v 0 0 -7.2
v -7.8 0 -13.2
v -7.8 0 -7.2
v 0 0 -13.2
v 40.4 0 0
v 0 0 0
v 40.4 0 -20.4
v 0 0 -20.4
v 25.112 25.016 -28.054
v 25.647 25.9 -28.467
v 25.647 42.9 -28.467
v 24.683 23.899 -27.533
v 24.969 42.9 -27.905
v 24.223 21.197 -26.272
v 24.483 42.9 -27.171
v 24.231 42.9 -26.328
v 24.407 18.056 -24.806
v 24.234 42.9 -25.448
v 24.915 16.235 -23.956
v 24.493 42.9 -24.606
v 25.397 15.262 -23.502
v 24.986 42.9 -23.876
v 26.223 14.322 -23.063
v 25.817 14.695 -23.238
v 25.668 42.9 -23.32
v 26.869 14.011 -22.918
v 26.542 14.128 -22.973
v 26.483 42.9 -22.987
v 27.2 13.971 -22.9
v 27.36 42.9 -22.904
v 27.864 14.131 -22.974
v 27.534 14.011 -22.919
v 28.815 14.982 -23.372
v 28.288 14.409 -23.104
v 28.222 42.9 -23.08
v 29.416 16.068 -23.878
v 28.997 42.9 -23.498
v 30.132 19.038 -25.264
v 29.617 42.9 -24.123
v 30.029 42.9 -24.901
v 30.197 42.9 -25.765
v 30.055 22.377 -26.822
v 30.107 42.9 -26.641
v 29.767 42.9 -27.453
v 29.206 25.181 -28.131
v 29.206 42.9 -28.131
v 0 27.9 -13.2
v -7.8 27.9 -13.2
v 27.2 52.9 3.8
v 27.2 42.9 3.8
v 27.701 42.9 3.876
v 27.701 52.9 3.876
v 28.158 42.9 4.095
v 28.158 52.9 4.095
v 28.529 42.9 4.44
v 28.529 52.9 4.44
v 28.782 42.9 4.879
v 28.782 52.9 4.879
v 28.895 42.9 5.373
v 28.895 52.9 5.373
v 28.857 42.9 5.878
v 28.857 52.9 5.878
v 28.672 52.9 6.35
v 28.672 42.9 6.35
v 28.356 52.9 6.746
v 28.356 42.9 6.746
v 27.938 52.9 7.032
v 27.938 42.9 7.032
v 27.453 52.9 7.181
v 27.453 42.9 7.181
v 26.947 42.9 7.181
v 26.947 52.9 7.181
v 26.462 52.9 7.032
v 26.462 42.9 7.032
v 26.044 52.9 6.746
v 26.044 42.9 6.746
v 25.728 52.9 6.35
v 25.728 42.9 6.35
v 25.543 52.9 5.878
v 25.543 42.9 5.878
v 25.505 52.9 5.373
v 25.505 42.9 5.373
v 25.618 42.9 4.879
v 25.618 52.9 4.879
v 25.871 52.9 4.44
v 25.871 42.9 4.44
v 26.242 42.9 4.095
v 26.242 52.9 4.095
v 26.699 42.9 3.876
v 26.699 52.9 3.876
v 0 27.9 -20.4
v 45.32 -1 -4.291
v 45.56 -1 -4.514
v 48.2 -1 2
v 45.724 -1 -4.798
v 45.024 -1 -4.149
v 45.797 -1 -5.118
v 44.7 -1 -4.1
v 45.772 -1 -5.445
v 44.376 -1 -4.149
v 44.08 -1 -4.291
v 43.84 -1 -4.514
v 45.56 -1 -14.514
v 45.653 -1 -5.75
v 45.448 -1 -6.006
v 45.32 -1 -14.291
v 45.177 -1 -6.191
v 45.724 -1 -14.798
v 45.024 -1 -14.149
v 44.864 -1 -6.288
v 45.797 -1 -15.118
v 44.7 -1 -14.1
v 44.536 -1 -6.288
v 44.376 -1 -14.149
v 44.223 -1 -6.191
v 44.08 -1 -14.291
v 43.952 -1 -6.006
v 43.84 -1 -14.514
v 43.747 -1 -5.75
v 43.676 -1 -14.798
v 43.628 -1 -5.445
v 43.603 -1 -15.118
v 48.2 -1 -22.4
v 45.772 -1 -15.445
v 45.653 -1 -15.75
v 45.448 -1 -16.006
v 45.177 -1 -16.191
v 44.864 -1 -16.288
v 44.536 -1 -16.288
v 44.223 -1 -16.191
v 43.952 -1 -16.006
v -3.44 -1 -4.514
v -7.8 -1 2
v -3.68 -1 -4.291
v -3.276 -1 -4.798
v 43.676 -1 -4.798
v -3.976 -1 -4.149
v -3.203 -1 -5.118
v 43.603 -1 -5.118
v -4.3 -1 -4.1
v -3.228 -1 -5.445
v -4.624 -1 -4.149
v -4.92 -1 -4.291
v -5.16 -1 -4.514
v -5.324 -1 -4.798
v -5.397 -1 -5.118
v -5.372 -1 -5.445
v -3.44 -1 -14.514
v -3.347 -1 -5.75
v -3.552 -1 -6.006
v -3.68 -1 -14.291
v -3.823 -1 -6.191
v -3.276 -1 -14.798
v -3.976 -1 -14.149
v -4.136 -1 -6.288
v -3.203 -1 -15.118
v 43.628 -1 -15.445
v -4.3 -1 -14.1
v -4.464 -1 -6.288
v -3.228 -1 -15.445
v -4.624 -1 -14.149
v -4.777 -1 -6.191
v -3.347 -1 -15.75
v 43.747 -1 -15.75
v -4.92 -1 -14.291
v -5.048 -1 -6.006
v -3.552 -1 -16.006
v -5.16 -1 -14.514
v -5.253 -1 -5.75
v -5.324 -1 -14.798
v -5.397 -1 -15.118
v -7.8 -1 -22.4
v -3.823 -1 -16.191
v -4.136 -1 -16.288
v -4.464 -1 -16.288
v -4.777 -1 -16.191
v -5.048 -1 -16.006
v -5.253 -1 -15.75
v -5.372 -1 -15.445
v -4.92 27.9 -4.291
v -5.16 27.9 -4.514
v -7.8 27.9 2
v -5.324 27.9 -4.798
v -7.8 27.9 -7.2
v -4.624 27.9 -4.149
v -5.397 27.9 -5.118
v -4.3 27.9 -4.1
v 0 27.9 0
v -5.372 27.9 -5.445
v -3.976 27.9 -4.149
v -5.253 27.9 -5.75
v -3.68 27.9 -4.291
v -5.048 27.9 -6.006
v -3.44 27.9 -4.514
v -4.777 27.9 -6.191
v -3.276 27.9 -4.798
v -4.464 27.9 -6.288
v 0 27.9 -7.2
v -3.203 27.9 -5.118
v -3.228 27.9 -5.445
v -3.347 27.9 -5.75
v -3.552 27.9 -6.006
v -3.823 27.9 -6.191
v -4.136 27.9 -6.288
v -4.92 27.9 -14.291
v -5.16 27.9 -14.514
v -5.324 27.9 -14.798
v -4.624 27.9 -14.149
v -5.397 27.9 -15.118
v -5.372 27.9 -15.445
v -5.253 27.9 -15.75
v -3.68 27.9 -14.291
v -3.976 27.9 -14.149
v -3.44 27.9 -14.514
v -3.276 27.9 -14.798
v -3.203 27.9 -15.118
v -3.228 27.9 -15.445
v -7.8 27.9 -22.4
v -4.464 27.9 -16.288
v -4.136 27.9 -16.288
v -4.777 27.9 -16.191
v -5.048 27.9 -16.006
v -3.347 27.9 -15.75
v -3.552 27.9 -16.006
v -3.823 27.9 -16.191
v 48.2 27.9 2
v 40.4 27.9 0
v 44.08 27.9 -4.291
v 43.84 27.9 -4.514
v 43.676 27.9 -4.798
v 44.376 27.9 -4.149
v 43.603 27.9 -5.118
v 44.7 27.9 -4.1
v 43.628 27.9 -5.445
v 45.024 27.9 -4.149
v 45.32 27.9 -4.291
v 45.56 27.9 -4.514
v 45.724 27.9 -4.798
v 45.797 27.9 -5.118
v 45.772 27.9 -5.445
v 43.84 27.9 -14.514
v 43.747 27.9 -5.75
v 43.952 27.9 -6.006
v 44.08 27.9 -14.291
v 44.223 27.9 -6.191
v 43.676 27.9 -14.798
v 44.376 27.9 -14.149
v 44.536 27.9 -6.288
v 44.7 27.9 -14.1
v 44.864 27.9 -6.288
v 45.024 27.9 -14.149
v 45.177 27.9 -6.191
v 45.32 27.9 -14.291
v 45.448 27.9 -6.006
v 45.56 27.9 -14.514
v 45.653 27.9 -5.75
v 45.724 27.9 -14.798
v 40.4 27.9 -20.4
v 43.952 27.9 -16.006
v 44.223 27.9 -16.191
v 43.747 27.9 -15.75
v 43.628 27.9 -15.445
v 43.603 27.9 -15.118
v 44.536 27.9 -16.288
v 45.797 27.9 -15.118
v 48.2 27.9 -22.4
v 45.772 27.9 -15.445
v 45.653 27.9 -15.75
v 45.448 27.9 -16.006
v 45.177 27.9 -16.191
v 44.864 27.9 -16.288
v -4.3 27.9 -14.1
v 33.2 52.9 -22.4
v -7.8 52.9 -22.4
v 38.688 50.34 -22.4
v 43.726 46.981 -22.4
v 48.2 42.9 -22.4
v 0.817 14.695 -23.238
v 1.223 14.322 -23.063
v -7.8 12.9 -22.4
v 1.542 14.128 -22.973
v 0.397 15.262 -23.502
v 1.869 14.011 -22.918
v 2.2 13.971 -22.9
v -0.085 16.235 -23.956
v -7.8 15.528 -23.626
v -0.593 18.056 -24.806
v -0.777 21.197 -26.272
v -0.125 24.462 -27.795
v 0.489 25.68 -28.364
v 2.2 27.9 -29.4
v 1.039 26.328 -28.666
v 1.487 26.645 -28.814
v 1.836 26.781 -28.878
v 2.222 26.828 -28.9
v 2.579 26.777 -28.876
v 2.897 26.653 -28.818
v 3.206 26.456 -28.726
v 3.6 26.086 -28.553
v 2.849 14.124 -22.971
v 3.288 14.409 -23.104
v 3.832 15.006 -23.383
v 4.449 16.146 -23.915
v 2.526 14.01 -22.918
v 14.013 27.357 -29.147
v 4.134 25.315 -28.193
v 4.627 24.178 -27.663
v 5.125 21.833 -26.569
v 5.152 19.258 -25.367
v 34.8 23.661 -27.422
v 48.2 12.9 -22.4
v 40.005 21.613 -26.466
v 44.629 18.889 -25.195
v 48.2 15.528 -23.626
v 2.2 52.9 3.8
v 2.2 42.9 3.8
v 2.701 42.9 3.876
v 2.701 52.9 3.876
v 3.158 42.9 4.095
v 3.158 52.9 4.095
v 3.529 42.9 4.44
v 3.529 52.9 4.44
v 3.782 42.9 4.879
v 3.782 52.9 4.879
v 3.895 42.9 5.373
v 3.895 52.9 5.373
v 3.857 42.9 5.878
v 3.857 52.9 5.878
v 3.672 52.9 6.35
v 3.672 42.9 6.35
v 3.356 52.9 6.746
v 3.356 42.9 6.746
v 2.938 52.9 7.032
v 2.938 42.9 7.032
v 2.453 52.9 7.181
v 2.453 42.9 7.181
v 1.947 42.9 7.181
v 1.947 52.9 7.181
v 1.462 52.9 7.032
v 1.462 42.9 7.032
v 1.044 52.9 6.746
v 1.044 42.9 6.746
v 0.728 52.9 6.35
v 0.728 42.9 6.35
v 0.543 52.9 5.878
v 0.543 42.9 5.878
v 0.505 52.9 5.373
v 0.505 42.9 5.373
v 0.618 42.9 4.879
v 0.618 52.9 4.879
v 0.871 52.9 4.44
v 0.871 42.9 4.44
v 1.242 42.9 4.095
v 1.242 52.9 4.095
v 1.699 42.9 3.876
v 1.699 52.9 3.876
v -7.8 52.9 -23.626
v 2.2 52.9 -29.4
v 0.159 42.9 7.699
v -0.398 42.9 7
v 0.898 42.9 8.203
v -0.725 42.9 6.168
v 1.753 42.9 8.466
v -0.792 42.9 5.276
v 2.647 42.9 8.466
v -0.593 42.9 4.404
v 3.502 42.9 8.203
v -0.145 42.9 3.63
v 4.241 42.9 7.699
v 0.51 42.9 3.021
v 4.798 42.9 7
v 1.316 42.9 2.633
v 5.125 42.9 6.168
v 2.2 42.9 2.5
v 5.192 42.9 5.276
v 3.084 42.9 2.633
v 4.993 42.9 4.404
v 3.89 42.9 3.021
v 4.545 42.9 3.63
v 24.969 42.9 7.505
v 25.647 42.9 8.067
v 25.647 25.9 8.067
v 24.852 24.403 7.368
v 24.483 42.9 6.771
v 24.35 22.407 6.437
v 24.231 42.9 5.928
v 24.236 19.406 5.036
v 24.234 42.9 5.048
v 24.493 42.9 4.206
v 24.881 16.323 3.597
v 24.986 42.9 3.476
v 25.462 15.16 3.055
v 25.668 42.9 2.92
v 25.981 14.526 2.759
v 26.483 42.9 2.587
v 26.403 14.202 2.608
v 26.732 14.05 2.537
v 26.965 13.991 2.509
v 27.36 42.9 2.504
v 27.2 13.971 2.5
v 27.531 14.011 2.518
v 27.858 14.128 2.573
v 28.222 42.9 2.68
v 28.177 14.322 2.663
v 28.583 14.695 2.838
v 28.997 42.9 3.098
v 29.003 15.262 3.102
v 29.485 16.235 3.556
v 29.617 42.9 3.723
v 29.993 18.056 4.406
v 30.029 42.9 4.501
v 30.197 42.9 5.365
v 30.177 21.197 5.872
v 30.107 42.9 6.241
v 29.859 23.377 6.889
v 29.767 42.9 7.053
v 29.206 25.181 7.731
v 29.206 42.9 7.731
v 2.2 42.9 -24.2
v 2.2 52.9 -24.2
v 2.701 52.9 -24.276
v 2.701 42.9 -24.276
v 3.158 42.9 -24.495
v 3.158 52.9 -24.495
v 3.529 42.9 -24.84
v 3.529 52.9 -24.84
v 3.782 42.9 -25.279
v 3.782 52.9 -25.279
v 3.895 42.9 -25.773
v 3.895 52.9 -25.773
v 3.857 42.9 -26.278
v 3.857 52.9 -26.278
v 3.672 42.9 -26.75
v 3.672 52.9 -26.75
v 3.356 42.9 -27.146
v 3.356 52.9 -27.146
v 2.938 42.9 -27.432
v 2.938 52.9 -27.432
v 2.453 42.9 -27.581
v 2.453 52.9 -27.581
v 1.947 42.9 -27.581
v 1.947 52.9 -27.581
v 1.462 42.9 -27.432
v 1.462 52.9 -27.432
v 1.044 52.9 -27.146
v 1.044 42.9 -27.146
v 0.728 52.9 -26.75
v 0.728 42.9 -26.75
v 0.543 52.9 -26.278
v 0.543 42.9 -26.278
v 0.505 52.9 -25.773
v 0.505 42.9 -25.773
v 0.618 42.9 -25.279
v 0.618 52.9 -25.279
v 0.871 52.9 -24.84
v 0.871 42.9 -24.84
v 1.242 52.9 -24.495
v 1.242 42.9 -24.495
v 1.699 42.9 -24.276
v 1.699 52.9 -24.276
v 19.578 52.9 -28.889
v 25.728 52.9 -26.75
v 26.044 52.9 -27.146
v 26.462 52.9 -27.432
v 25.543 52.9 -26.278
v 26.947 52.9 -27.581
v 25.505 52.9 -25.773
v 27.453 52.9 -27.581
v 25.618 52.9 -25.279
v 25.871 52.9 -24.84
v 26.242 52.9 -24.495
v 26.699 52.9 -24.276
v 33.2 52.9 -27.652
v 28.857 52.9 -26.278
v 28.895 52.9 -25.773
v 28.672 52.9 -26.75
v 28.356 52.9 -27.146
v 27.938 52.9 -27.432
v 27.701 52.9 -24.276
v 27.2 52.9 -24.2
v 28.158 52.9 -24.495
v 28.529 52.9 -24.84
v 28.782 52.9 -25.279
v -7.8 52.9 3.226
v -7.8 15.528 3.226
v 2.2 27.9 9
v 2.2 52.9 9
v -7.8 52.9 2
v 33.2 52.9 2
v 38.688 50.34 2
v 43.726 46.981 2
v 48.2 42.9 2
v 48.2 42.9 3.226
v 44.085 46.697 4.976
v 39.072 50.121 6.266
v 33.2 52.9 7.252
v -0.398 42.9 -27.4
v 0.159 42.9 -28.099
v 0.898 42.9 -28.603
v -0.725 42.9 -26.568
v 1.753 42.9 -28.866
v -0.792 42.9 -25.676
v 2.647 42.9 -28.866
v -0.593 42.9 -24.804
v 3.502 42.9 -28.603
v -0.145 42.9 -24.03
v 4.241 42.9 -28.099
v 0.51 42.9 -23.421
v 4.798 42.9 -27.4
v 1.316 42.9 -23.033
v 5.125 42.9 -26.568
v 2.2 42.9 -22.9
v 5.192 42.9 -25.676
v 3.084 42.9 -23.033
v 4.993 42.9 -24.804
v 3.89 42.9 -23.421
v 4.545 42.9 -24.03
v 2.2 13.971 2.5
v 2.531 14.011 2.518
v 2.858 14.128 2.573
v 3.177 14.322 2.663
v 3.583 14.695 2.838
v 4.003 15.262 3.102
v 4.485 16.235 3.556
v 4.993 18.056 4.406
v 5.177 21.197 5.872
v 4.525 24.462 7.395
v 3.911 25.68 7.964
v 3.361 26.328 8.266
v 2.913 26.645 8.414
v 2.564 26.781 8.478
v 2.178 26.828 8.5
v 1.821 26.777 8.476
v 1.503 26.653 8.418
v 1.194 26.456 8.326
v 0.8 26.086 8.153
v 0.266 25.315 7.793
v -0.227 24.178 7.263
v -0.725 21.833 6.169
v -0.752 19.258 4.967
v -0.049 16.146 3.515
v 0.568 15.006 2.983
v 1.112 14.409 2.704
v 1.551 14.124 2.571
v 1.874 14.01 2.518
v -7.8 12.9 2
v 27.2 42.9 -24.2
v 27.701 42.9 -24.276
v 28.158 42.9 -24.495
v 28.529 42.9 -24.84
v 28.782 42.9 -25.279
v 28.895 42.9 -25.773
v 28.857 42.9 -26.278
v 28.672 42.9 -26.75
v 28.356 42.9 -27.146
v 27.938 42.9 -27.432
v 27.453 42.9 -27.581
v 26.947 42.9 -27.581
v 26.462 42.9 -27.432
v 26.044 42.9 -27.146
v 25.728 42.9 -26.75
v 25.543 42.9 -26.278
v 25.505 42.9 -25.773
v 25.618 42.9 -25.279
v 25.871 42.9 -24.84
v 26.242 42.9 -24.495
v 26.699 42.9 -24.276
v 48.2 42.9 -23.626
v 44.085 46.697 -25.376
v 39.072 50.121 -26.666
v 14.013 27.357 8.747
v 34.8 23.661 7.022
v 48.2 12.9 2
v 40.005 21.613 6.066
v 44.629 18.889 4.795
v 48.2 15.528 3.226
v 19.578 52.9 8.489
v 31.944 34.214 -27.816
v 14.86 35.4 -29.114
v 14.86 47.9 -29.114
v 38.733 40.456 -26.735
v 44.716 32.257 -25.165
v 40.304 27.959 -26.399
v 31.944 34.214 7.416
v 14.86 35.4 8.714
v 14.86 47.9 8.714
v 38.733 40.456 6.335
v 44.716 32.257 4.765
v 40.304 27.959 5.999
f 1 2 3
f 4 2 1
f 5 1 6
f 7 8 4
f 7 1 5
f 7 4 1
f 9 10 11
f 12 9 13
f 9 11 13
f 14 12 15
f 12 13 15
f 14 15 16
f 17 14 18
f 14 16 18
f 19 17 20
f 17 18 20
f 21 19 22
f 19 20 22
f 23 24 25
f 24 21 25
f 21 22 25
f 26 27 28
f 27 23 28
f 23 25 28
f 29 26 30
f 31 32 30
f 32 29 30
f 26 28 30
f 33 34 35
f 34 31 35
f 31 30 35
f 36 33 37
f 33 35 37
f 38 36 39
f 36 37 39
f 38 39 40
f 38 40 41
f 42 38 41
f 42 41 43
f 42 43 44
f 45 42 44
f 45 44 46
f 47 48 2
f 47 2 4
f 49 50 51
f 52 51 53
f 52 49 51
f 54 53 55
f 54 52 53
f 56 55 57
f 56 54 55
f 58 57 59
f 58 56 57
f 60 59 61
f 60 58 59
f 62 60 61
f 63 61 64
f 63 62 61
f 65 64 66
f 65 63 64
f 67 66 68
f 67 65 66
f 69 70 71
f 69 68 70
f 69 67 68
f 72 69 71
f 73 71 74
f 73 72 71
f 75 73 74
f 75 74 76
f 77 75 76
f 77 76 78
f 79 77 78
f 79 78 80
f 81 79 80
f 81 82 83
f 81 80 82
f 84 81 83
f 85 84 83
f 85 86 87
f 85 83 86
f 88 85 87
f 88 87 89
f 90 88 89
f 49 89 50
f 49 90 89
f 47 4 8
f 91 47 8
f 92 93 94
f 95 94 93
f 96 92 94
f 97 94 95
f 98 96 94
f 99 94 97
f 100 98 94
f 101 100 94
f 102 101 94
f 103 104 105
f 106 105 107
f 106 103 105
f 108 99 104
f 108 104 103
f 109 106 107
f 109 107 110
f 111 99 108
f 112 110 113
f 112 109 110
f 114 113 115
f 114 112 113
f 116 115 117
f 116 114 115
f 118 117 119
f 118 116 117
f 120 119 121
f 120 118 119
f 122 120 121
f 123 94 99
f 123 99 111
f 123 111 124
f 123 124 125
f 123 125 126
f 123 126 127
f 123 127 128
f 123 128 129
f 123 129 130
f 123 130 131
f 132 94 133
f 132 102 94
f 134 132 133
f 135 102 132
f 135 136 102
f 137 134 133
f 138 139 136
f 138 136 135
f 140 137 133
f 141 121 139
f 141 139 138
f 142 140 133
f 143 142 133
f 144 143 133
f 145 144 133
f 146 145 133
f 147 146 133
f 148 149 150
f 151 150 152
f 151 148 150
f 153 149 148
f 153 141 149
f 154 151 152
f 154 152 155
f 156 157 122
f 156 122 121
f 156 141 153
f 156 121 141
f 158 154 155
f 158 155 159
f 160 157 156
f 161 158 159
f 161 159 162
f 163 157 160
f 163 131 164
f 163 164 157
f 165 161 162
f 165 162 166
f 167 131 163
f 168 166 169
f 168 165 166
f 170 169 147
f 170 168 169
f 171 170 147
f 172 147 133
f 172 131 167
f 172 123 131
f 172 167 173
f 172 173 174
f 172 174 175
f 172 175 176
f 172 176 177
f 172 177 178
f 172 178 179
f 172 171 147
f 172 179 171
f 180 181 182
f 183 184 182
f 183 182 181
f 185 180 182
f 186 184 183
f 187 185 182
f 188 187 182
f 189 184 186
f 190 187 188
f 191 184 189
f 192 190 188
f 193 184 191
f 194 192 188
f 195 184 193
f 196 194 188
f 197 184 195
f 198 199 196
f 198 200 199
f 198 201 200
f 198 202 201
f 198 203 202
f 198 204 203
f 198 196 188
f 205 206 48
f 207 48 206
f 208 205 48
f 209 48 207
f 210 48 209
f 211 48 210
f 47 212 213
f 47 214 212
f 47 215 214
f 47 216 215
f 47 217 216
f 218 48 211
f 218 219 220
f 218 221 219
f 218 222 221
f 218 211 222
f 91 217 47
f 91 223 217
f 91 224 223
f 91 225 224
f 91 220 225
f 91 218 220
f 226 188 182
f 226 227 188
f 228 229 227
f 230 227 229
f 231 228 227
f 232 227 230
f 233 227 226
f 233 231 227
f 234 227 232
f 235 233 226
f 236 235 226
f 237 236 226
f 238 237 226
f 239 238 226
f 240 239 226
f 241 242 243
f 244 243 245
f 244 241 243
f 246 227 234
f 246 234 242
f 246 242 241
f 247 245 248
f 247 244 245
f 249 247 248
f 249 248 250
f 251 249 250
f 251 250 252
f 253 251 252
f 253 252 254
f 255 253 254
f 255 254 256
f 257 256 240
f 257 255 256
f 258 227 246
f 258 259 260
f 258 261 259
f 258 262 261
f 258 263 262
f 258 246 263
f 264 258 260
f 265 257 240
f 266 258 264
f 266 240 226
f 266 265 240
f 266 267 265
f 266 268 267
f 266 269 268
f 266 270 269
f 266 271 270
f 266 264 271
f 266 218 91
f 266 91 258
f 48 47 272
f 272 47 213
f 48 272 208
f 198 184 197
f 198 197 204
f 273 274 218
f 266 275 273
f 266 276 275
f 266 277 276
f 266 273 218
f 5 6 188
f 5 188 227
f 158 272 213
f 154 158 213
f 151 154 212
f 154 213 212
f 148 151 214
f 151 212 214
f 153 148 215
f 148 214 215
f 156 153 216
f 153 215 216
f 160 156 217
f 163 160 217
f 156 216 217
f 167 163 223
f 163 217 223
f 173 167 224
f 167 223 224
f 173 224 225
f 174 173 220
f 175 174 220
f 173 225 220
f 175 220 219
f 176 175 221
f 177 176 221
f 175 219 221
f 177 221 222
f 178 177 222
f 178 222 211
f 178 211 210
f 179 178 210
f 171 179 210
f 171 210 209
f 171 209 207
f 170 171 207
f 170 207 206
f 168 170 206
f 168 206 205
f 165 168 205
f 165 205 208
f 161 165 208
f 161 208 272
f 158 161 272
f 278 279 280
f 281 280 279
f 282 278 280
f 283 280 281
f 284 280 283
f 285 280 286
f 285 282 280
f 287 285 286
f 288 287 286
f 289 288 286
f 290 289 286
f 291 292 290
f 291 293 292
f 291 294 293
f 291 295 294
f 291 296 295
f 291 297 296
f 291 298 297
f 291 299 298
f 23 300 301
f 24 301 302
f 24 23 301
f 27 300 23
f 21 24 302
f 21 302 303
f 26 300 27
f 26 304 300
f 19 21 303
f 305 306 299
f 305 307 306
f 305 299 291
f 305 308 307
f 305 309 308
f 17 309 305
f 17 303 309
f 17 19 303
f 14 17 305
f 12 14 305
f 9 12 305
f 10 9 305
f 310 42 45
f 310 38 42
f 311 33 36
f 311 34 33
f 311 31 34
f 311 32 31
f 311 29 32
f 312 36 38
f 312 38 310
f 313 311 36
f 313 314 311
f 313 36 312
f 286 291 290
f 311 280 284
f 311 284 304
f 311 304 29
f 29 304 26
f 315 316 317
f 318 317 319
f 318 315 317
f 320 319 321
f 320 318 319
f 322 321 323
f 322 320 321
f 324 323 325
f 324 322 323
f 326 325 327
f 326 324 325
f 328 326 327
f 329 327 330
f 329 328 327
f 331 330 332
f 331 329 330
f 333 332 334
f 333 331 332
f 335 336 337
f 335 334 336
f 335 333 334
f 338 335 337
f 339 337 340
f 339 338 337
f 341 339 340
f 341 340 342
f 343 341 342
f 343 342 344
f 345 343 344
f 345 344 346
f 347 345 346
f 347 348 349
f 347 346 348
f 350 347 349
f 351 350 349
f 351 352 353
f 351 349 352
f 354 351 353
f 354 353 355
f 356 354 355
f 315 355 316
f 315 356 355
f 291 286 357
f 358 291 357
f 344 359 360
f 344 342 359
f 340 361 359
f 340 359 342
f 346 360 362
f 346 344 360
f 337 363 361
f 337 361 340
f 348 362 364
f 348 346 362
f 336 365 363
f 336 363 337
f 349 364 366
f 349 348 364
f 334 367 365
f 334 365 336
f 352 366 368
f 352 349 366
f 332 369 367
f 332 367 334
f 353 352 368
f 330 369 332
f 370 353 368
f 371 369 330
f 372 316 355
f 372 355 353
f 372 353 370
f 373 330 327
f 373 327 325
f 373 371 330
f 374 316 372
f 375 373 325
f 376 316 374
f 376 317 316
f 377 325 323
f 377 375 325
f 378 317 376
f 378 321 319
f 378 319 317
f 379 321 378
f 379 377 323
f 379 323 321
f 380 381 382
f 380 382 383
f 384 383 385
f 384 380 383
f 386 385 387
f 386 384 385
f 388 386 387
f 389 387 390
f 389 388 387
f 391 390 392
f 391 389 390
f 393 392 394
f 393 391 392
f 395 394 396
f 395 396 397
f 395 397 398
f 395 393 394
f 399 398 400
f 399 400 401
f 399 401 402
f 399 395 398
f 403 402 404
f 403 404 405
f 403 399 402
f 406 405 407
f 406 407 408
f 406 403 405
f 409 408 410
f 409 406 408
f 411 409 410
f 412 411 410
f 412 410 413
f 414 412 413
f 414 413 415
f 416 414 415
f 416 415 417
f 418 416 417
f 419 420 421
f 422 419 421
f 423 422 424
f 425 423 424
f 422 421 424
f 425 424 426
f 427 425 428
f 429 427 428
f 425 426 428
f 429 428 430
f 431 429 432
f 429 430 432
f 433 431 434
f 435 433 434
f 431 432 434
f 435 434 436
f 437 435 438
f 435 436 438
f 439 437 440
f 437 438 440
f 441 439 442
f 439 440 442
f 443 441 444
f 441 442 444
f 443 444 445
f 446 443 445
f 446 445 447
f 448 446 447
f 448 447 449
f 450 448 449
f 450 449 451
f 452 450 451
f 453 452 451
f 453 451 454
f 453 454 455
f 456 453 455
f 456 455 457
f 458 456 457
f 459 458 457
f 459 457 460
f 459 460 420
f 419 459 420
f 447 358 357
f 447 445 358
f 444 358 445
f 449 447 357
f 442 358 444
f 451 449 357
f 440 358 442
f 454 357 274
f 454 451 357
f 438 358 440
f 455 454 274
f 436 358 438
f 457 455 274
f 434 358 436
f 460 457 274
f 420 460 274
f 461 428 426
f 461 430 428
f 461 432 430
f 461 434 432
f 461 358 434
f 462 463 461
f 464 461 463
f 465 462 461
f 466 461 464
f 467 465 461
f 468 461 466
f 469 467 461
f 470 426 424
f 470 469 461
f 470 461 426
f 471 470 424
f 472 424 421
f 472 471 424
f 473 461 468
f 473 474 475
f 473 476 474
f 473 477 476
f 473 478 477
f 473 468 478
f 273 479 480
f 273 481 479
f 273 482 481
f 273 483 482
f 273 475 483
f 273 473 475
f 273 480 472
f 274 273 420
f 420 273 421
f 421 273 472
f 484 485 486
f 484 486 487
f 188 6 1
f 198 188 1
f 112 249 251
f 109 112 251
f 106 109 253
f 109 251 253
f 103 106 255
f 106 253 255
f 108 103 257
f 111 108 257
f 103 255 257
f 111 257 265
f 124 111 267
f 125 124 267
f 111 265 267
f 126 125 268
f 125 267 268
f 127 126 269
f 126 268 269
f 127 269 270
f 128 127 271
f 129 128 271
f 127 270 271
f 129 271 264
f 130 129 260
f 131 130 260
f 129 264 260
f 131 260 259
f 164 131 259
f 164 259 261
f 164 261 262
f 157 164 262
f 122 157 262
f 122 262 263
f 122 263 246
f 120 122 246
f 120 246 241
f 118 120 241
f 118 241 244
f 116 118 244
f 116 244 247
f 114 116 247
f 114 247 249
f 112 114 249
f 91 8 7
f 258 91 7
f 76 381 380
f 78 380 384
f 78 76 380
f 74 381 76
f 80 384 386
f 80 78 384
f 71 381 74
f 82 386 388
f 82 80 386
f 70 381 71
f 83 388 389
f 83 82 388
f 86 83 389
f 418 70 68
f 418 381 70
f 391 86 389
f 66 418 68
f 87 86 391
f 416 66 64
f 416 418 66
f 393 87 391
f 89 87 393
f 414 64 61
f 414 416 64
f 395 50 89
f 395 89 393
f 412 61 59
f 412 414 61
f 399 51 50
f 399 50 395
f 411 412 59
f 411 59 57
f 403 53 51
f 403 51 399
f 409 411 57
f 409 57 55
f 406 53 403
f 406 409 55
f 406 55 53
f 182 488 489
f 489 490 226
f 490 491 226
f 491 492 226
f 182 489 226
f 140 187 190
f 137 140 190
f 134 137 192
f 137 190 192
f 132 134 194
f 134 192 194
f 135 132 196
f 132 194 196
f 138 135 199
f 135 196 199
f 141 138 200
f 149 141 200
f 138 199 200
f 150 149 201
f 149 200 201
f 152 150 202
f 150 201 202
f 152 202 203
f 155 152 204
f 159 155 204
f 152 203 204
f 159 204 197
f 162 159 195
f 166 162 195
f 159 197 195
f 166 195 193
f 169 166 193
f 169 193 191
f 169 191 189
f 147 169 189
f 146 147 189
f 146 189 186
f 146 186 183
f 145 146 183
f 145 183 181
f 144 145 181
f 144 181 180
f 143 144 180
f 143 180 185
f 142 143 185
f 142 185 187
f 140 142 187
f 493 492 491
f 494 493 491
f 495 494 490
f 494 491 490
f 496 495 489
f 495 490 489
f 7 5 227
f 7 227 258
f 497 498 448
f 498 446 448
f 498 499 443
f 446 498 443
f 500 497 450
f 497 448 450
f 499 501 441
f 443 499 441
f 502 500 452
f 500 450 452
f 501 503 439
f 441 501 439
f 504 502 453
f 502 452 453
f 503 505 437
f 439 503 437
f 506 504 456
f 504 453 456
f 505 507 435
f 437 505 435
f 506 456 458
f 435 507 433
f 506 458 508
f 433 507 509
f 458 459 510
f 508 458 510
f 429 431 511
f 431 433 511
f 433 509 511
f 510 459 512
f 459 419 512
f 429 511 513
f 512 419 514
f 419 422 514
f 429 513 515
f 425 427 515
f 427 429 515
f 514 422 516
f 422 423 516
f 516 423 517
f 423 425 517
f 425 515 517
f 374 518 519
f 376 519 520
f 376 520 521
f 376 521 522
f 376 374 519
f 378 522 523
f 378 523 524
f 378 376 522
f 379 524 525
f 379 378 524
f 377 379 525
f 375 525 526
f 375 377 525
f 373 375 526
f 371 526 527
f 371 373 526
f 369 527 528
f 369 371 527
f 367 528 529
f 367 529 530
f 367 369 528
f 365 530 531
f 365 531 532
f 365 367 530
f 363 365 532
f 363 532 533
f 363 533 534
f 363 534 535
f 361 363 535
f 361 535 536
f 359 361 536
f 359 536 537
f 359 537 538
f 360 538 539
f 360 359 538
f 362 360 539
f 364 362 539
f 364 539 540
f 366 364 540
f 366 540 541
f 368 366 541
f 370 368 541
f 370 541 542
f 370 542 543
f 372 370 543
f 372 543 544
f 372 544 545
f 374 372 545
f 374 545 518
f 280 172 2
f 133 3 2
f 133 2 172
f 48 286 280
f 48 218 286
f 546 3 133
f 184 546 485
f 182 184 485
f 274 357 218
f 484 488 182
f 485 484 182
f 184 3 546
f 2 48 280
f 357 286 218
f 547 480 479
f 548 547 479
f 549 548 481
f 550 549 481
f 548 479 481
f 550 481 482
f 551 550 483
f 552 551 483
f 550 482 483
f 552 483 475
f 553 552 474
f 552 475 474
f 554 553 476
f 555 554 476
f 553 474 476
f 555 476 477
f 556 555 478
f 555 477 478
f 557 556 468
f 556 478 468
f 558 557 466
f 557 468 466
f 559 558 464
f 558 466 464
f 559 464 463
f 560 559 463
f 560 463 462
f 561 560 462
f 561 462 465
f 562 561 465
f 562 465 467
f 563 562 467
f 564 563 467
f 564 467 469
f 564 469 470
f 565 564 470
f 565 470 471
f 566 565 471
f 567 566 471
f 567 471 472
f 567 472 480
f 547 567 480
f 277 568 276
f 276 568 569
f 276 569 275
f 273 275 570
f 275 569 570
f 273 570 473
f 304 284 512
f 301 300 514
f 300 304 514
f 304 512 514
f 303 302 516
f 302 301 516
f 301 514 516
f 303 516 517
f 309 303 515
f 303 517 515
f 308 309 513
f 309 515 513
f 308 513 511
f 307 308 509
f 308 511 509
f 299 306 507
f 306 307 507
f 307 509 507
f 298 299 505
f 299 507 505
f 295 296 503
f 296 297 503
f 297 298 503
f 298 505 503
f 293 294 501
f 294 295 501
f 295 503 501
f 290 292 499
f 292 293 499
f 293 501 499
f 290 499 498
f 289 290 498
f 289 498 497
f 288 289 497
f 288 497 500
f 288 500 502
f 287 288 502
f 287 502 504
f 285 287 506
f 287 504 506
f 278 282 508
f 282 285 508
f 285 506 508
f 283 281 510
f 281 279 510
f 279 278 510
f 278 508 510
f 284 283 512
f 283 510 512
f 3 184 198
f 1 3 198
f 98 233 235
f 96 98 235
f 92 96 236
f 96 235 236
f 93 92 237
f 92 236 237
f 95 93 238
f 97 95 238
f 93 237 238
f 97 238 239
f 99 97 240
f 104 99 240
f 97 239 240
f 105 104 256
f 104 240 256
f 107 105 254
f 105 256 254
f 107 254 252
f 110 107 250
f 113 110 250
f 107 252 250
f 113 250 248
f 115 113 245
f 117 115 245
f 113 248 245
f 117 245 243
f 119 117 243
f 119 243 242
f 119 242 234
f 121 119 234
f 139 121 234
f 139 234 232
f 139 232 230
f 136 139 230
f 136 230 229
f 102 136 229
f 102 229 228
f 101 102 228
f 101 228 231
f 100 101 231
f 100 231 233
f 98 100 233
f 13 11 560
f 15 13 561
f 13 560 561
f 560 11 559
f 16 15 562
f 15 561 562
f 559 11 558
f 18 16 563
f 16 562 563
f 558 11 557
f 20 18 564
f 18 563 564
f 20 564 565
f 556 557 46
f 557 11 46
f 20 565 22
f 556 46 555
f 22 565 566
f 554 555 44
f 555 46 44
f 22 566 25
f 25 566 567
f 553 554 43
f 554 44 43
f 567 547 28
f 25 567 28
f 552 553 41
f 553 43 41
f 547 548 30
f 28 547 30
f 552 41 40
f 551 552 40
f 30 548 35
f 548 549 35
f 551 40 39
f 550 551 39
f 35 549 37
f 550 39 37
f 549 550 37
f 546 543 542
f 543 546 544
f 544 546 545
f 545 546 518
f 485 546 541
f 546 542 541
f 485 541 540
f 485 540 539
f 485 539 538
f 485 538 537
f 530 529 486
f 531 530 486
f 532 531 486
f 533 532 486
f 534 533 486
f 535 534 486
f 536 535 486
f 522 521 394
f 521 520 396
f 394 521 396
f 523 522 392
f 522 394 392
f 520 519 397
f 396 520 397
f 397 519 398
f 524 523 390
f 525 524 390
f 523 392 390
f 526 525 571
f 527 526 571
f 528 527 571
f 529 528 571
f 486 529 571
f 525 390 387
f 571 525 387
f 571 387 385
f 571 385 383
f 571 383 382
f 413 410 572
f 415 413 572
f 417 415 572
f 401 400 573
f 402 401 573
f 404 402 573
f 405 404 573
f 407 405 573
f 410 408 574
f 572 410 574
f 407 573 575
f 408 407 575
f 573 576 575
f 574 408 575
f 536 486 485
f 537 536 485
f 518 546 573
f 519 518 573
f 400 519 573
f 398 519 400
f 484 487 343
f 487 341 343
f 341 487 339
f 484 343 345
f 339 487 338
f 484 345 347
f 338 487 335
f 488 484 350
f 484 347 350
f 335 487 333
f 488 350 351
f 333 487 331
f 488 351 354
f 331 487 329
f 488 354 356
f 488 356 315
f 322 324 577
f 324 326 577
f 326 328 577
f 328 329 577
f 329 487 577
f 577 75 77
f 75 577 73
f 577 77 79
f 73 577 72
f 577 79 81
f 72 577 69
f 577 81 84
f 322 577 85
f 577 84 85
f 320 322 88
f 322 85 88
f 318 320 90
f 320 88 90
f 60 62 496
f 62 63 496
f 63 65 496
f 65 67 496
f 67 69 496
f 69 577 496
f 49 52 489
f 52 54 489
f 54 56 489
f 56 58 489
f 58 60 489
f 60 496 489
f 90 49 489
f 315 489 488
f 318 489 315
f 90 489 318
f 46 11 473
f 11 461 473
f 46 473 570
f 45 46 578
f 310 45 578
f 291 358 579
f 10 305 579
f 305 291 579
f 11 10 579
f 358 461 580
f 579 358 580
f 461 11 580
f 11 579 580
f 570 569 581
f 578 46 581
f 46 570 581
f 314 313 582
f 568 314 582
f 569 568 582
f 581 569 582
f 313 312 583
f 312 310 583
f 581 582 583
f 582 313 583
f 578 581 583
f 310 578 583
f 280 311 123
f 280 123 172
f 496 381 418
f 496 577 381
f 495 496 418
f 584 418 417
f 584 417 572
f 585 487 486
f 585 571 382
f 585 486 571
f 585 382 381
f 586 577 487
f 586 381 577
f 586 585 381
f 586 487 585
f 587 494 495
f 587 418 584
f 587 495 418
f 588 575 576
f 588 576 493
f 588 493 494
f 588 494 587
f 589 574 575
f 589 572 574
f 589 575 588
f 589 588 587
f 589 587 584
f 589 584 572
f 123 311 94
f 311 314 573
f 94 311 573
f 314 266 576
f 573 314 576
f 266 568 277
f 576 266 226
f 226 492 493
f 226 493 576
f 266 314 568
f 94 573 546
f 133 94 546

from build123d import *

# Parameters (mm, degrees)
SKETCH1_W               = 56
SKETCH1_H               = 24.4
SKETCH1_W_2             = 40.4
SKETCH1_H_2             = 20.4
BOSS_EXTRUDE1_DEPTH     = 27.9
SKETCH2_W               = 56
SKETCH2_H               = 24.4
BOSS_EXTRUDE2_DEPTH     = 1
BOSS_EXTRUDE3_DEPTH     = 56
SKETCH4_R               = 1.7
CUT_EXTRUDE1_DEPTH      = 79.056453929
CUT_EXTRUDE2_START      = -10
SKETCH5_R               = 3
CUT_EXTRUDE2_DEPTH      = 69.056453929
CHAMFER1_SIZE           = 10
CHAMFER1_SIZE2          = 5.773502692
CHAMFER2_SIZE           = 10
CHAMFER2_SIZE2          = 5.773502692
CHAMFER3_SIZE           = 10
CHAMFER3_SIZE2          = 5.773502692
CHAMFER4_SIZE           = 10
CHAMFER4_SIZE2          = 5.773502692
SKETCH6_W               = 7.8
SKETCH6_H               = 6
CUT_EXTRUDE3_DEPTH      = 27.9
SKETCH7_R               = 1.1
CUT_EXTRUDE4_DEPTH      = 30
CUT_EXTRUDE5_DEPTH      = 79.056453929
CUT_EXTRUDE6_DEPTH      = 79.151199776
CUT_EXTRUDE6_DEPTH_BACK = 79.151199776


with BuildPart() as part:
    # Sketch1 → Boss-Extrude1 (new body)
    with BuildSketch(Plane(origin=(0, 0, 0), x_dir=(1, 0, 0), z_dir=(0, 1, 0))):
        with Locations((20.2, 10.2)):
            Rectangle(SKETCH1_W, SKETCH1_H)
        with Locations((20.2, 10.2)):
            Rectangle(SKETCH1_W_2, SKETCH1_H_2, mode=Mode.SUBTRACT)
    extrude(amount=BOSS_EXTRUDE1_DEPTH)

    # Sketch2 → Boss-Extrude2 (add)
    with BuildSketch(Plane(origin=(0, 0, 0), x_dir=(-1, 0, 0), z_dir=(0, -1, 0))):
        with Locations((-20.2, 10.2)):
            Rectangle(SKETCH2_W, SKETCH2_H)
    extrude(amount=BOSS_EXTRUDE2_DEPTH)

    # Sketch3 → Boss-Extrude3 (add)
    with BuildSketch(Plane(origin=(48.2, 0, 0), x_dir=(0, 0, -1), z_dir=(1, 0, 0))):
        Polygon((22.4, 12.9), (29.4, 27.9), (29.4, 52.9), (22.4, 52.9), align=None)
    boss_extrude3 = extrude(amount=-BOSS_EXTRUDE3_DEPTH)

    # Sketch4 → Cut-Extrude1 (cut, through all)
    with BuildSketch(Plane(origin=(0, 52.9, 0), x_dir=(1, 0, 0), z_dir=(0, 1, 0))):
        with Locations(Location((2.2, 25.9, 0), (0, 0, 270))):
            Circle(SKETCH4_R)
        with Locations(Location((27.2, 25.9, 0), (0, 0, 270))):
            Circle(SKETCH4_R)
    cut_extrude1 = extrude(amount=-CUT_EXTRUDE1_DEPTH, mode=Mode.SUBTRACT)

    # Sketch5 → Cut-Extrude2 (cut, through all)
    with BuildSketch(Plane(origin=(0, 52.9, 0), x_dir=(1, 0, 0), z_dir=(0, 1, 0)).offset(CUT_EXTRUDE2_START)):
        with Locations(Location((2.2, 25.9, 0), (0, 0, 270))):
            Circle(SKETCH5_R)
        with Locations(Location((27.2, 25.9, 0), (0, 0, 270))):
            Circle(SKETCH5_R)
    cut_extrude2 = extrude(amount=-CUT_EXTRUDE2_DEPTH, mode=Mode.SUBTRACT)

    # Mirror1: Boss-Extrude3, Cut-Extrude1, Cut-Extrude2 across plane
    add(boss_extrude3.mirror(Plane.XY.offset(-10.2)))
    add(cut_extrude1.mirror(Plane.XY.offset(-10.2)), mode=Mode.SUBTRACT)
    add(cut_extrude2.mirror(Plane.XY.offset(-10.2)), mode=Mode.SUBTRACT)

    # Chamfer1
    chamfer1_edges = [part.edges().sort_by_distance(p)[0] for p in [
        (-7.8, 40.4, -29.4),
    ]]
    chamfer1_side = [part.faces().sort_by_distance(p)[0] for p in [
        (20.2, 40.4, -29.4),
    ]]
    chamfer(chamfer1_edges, length=CHAMFER1_SIZE, length2=CHAMFER1_SIZE2, reference=chamfer1_side[0])

    # Chamfer2
    chamfer2_edges = [part.edges().sort_by_distance(p)[0] for p in [
        (48.2, 40.4, -29.4),
    ]]
    chamfer2_side = [part.faces().sort_by_distance(p)[0] for p in [
        (25.2, 40.4, -29.4),
    ]]
    chamfer(chamfer2_edges, length=CHAMFER2_SIZE, length2=CHAMFER2_SIZE2, reference=chamfer2_side[0])

    # Chamfer3
    chamfer3_edges = [part.edges().sort_by_distance(p)[0] for p in [
        (-7.8, 40.4, 9),
    ]]
    chamfer3_side = [part.faces().sort_by_distance(p)[0] for p in [
        (20.2, 40.4, 9),
    ]]
    chamfer(chamfer3_edges, length=CHAMFER3_SIZE, length2=CHAMFER3_SIZE2, reference=chamfer3_side[0])

    # Chamfer4
    chamfer4_edges = [part.edges().sort_by_distance(p)[0] for p in [
        (48.2, 40.4, 9),
    ]]
    chamfer4_side = [part.faces().sort_by_distance(p)[0] for p in [
        (25.2, 40.4, 9),
    ]]
    chamfer(chamfer4_edges, length=CHAMFER4_SIZE, length2=CHAMFER4_SIZE2, reference=chamfer4_side[0])

    # Sketch6 → Cut-Extrude3 (cut)
    with BuildSketch(Plane(origin=(0, 27.9, 0), x_dir=(1, 0, 0), z_dir=(0, 1, 0))):
        with Locations((-3.9, 10.2)):
            Rectangle(SKETCH6_W, SKETCH6_H)
    extrude(amount=-CUT_EXTRUDE3_DEPTH, mode=Mode.SUBTRACT)

    # Sketch7 → Cut-Extrude4 (cut)
    with BuildSketch(Plane(origin=(0, 27.9, 0), x_dir=(1, 0, 0), z_dir=(0, 1, 0))):
        with Locations(Location((-4.3, 15.2, 0), (0, 0, 270))):
            Circle(SKETCH7_R)
        with Locations(Location((-4.3, 5.2, 0), (0, 0, 270))):
            Circle(SKETCH7_R)
        with Locations(Location((44.7, 15.2, 0), (0, 0, 270))):
            Circle(SKETCH7_R)
        with Locations(Location((44.7, 5.2, 0), (0, 0, 270))):
            Circle(SKETCH7_R)
    extrude(amount=-CUT_EXTRUDE4_DEPTH, mode=Mode.SUBTRACT)

    # Sketch8 → Cut-Extrude5 (cut, symmetric)
    with BuildSketch(Plane(origin=(0, 52.9, 0), x_dir=(1, 0, 0), z_dir=(0, 1, 0))):
        with BuildLine():
            add(Edge.make_bspline(
                [(2.2, 29.4), (38.687561205, 29.118506407), (48.2, 23.626497308)],
                knots=[0, 0, 0, 1, 1, 1], degree=2))
            Line((48.2, 23.626497308), (38.2, 29.4))
            Line((38.2, 29.4), (2.2, 29.4))
        make_face()
    cut_extrude5 = extrude(amount=CUT_EXTRUDE5_DEPTH, both=True, mode=Mode.SUBTRACT)

    # Mirror2: Cut-Extrude5 across plane
    add(cut_extrude5.mirror(Plane.XY.offset(-10.2)), mode=Mode.SUBTRACT)

    # Sketch9 → Cut-Extrude6 (cut, two sides: drawn at the far end of the back side and taken through both)
    with BuildSketch(Plane.XY.offset(2).offset(-CUT_EXTRUDE6_DEPTH_BACK)):
        with BuildLine():
            Line((33.2, 52.9), (48.2, 52.9))
            Line((48.2, 52.9), (48.2, 42.9))
            ThreePointArc((48.2, 42.9), (41.270707085, 48.756060628), (33.2, 52.9))
        make_face()
    extrude(amount=CUT_EXTRUDE6_DEPTH + CUT_EXTRUDE6_DEPTH_BACK, mode=Mode.SUBTRACT)


solid = part.part
